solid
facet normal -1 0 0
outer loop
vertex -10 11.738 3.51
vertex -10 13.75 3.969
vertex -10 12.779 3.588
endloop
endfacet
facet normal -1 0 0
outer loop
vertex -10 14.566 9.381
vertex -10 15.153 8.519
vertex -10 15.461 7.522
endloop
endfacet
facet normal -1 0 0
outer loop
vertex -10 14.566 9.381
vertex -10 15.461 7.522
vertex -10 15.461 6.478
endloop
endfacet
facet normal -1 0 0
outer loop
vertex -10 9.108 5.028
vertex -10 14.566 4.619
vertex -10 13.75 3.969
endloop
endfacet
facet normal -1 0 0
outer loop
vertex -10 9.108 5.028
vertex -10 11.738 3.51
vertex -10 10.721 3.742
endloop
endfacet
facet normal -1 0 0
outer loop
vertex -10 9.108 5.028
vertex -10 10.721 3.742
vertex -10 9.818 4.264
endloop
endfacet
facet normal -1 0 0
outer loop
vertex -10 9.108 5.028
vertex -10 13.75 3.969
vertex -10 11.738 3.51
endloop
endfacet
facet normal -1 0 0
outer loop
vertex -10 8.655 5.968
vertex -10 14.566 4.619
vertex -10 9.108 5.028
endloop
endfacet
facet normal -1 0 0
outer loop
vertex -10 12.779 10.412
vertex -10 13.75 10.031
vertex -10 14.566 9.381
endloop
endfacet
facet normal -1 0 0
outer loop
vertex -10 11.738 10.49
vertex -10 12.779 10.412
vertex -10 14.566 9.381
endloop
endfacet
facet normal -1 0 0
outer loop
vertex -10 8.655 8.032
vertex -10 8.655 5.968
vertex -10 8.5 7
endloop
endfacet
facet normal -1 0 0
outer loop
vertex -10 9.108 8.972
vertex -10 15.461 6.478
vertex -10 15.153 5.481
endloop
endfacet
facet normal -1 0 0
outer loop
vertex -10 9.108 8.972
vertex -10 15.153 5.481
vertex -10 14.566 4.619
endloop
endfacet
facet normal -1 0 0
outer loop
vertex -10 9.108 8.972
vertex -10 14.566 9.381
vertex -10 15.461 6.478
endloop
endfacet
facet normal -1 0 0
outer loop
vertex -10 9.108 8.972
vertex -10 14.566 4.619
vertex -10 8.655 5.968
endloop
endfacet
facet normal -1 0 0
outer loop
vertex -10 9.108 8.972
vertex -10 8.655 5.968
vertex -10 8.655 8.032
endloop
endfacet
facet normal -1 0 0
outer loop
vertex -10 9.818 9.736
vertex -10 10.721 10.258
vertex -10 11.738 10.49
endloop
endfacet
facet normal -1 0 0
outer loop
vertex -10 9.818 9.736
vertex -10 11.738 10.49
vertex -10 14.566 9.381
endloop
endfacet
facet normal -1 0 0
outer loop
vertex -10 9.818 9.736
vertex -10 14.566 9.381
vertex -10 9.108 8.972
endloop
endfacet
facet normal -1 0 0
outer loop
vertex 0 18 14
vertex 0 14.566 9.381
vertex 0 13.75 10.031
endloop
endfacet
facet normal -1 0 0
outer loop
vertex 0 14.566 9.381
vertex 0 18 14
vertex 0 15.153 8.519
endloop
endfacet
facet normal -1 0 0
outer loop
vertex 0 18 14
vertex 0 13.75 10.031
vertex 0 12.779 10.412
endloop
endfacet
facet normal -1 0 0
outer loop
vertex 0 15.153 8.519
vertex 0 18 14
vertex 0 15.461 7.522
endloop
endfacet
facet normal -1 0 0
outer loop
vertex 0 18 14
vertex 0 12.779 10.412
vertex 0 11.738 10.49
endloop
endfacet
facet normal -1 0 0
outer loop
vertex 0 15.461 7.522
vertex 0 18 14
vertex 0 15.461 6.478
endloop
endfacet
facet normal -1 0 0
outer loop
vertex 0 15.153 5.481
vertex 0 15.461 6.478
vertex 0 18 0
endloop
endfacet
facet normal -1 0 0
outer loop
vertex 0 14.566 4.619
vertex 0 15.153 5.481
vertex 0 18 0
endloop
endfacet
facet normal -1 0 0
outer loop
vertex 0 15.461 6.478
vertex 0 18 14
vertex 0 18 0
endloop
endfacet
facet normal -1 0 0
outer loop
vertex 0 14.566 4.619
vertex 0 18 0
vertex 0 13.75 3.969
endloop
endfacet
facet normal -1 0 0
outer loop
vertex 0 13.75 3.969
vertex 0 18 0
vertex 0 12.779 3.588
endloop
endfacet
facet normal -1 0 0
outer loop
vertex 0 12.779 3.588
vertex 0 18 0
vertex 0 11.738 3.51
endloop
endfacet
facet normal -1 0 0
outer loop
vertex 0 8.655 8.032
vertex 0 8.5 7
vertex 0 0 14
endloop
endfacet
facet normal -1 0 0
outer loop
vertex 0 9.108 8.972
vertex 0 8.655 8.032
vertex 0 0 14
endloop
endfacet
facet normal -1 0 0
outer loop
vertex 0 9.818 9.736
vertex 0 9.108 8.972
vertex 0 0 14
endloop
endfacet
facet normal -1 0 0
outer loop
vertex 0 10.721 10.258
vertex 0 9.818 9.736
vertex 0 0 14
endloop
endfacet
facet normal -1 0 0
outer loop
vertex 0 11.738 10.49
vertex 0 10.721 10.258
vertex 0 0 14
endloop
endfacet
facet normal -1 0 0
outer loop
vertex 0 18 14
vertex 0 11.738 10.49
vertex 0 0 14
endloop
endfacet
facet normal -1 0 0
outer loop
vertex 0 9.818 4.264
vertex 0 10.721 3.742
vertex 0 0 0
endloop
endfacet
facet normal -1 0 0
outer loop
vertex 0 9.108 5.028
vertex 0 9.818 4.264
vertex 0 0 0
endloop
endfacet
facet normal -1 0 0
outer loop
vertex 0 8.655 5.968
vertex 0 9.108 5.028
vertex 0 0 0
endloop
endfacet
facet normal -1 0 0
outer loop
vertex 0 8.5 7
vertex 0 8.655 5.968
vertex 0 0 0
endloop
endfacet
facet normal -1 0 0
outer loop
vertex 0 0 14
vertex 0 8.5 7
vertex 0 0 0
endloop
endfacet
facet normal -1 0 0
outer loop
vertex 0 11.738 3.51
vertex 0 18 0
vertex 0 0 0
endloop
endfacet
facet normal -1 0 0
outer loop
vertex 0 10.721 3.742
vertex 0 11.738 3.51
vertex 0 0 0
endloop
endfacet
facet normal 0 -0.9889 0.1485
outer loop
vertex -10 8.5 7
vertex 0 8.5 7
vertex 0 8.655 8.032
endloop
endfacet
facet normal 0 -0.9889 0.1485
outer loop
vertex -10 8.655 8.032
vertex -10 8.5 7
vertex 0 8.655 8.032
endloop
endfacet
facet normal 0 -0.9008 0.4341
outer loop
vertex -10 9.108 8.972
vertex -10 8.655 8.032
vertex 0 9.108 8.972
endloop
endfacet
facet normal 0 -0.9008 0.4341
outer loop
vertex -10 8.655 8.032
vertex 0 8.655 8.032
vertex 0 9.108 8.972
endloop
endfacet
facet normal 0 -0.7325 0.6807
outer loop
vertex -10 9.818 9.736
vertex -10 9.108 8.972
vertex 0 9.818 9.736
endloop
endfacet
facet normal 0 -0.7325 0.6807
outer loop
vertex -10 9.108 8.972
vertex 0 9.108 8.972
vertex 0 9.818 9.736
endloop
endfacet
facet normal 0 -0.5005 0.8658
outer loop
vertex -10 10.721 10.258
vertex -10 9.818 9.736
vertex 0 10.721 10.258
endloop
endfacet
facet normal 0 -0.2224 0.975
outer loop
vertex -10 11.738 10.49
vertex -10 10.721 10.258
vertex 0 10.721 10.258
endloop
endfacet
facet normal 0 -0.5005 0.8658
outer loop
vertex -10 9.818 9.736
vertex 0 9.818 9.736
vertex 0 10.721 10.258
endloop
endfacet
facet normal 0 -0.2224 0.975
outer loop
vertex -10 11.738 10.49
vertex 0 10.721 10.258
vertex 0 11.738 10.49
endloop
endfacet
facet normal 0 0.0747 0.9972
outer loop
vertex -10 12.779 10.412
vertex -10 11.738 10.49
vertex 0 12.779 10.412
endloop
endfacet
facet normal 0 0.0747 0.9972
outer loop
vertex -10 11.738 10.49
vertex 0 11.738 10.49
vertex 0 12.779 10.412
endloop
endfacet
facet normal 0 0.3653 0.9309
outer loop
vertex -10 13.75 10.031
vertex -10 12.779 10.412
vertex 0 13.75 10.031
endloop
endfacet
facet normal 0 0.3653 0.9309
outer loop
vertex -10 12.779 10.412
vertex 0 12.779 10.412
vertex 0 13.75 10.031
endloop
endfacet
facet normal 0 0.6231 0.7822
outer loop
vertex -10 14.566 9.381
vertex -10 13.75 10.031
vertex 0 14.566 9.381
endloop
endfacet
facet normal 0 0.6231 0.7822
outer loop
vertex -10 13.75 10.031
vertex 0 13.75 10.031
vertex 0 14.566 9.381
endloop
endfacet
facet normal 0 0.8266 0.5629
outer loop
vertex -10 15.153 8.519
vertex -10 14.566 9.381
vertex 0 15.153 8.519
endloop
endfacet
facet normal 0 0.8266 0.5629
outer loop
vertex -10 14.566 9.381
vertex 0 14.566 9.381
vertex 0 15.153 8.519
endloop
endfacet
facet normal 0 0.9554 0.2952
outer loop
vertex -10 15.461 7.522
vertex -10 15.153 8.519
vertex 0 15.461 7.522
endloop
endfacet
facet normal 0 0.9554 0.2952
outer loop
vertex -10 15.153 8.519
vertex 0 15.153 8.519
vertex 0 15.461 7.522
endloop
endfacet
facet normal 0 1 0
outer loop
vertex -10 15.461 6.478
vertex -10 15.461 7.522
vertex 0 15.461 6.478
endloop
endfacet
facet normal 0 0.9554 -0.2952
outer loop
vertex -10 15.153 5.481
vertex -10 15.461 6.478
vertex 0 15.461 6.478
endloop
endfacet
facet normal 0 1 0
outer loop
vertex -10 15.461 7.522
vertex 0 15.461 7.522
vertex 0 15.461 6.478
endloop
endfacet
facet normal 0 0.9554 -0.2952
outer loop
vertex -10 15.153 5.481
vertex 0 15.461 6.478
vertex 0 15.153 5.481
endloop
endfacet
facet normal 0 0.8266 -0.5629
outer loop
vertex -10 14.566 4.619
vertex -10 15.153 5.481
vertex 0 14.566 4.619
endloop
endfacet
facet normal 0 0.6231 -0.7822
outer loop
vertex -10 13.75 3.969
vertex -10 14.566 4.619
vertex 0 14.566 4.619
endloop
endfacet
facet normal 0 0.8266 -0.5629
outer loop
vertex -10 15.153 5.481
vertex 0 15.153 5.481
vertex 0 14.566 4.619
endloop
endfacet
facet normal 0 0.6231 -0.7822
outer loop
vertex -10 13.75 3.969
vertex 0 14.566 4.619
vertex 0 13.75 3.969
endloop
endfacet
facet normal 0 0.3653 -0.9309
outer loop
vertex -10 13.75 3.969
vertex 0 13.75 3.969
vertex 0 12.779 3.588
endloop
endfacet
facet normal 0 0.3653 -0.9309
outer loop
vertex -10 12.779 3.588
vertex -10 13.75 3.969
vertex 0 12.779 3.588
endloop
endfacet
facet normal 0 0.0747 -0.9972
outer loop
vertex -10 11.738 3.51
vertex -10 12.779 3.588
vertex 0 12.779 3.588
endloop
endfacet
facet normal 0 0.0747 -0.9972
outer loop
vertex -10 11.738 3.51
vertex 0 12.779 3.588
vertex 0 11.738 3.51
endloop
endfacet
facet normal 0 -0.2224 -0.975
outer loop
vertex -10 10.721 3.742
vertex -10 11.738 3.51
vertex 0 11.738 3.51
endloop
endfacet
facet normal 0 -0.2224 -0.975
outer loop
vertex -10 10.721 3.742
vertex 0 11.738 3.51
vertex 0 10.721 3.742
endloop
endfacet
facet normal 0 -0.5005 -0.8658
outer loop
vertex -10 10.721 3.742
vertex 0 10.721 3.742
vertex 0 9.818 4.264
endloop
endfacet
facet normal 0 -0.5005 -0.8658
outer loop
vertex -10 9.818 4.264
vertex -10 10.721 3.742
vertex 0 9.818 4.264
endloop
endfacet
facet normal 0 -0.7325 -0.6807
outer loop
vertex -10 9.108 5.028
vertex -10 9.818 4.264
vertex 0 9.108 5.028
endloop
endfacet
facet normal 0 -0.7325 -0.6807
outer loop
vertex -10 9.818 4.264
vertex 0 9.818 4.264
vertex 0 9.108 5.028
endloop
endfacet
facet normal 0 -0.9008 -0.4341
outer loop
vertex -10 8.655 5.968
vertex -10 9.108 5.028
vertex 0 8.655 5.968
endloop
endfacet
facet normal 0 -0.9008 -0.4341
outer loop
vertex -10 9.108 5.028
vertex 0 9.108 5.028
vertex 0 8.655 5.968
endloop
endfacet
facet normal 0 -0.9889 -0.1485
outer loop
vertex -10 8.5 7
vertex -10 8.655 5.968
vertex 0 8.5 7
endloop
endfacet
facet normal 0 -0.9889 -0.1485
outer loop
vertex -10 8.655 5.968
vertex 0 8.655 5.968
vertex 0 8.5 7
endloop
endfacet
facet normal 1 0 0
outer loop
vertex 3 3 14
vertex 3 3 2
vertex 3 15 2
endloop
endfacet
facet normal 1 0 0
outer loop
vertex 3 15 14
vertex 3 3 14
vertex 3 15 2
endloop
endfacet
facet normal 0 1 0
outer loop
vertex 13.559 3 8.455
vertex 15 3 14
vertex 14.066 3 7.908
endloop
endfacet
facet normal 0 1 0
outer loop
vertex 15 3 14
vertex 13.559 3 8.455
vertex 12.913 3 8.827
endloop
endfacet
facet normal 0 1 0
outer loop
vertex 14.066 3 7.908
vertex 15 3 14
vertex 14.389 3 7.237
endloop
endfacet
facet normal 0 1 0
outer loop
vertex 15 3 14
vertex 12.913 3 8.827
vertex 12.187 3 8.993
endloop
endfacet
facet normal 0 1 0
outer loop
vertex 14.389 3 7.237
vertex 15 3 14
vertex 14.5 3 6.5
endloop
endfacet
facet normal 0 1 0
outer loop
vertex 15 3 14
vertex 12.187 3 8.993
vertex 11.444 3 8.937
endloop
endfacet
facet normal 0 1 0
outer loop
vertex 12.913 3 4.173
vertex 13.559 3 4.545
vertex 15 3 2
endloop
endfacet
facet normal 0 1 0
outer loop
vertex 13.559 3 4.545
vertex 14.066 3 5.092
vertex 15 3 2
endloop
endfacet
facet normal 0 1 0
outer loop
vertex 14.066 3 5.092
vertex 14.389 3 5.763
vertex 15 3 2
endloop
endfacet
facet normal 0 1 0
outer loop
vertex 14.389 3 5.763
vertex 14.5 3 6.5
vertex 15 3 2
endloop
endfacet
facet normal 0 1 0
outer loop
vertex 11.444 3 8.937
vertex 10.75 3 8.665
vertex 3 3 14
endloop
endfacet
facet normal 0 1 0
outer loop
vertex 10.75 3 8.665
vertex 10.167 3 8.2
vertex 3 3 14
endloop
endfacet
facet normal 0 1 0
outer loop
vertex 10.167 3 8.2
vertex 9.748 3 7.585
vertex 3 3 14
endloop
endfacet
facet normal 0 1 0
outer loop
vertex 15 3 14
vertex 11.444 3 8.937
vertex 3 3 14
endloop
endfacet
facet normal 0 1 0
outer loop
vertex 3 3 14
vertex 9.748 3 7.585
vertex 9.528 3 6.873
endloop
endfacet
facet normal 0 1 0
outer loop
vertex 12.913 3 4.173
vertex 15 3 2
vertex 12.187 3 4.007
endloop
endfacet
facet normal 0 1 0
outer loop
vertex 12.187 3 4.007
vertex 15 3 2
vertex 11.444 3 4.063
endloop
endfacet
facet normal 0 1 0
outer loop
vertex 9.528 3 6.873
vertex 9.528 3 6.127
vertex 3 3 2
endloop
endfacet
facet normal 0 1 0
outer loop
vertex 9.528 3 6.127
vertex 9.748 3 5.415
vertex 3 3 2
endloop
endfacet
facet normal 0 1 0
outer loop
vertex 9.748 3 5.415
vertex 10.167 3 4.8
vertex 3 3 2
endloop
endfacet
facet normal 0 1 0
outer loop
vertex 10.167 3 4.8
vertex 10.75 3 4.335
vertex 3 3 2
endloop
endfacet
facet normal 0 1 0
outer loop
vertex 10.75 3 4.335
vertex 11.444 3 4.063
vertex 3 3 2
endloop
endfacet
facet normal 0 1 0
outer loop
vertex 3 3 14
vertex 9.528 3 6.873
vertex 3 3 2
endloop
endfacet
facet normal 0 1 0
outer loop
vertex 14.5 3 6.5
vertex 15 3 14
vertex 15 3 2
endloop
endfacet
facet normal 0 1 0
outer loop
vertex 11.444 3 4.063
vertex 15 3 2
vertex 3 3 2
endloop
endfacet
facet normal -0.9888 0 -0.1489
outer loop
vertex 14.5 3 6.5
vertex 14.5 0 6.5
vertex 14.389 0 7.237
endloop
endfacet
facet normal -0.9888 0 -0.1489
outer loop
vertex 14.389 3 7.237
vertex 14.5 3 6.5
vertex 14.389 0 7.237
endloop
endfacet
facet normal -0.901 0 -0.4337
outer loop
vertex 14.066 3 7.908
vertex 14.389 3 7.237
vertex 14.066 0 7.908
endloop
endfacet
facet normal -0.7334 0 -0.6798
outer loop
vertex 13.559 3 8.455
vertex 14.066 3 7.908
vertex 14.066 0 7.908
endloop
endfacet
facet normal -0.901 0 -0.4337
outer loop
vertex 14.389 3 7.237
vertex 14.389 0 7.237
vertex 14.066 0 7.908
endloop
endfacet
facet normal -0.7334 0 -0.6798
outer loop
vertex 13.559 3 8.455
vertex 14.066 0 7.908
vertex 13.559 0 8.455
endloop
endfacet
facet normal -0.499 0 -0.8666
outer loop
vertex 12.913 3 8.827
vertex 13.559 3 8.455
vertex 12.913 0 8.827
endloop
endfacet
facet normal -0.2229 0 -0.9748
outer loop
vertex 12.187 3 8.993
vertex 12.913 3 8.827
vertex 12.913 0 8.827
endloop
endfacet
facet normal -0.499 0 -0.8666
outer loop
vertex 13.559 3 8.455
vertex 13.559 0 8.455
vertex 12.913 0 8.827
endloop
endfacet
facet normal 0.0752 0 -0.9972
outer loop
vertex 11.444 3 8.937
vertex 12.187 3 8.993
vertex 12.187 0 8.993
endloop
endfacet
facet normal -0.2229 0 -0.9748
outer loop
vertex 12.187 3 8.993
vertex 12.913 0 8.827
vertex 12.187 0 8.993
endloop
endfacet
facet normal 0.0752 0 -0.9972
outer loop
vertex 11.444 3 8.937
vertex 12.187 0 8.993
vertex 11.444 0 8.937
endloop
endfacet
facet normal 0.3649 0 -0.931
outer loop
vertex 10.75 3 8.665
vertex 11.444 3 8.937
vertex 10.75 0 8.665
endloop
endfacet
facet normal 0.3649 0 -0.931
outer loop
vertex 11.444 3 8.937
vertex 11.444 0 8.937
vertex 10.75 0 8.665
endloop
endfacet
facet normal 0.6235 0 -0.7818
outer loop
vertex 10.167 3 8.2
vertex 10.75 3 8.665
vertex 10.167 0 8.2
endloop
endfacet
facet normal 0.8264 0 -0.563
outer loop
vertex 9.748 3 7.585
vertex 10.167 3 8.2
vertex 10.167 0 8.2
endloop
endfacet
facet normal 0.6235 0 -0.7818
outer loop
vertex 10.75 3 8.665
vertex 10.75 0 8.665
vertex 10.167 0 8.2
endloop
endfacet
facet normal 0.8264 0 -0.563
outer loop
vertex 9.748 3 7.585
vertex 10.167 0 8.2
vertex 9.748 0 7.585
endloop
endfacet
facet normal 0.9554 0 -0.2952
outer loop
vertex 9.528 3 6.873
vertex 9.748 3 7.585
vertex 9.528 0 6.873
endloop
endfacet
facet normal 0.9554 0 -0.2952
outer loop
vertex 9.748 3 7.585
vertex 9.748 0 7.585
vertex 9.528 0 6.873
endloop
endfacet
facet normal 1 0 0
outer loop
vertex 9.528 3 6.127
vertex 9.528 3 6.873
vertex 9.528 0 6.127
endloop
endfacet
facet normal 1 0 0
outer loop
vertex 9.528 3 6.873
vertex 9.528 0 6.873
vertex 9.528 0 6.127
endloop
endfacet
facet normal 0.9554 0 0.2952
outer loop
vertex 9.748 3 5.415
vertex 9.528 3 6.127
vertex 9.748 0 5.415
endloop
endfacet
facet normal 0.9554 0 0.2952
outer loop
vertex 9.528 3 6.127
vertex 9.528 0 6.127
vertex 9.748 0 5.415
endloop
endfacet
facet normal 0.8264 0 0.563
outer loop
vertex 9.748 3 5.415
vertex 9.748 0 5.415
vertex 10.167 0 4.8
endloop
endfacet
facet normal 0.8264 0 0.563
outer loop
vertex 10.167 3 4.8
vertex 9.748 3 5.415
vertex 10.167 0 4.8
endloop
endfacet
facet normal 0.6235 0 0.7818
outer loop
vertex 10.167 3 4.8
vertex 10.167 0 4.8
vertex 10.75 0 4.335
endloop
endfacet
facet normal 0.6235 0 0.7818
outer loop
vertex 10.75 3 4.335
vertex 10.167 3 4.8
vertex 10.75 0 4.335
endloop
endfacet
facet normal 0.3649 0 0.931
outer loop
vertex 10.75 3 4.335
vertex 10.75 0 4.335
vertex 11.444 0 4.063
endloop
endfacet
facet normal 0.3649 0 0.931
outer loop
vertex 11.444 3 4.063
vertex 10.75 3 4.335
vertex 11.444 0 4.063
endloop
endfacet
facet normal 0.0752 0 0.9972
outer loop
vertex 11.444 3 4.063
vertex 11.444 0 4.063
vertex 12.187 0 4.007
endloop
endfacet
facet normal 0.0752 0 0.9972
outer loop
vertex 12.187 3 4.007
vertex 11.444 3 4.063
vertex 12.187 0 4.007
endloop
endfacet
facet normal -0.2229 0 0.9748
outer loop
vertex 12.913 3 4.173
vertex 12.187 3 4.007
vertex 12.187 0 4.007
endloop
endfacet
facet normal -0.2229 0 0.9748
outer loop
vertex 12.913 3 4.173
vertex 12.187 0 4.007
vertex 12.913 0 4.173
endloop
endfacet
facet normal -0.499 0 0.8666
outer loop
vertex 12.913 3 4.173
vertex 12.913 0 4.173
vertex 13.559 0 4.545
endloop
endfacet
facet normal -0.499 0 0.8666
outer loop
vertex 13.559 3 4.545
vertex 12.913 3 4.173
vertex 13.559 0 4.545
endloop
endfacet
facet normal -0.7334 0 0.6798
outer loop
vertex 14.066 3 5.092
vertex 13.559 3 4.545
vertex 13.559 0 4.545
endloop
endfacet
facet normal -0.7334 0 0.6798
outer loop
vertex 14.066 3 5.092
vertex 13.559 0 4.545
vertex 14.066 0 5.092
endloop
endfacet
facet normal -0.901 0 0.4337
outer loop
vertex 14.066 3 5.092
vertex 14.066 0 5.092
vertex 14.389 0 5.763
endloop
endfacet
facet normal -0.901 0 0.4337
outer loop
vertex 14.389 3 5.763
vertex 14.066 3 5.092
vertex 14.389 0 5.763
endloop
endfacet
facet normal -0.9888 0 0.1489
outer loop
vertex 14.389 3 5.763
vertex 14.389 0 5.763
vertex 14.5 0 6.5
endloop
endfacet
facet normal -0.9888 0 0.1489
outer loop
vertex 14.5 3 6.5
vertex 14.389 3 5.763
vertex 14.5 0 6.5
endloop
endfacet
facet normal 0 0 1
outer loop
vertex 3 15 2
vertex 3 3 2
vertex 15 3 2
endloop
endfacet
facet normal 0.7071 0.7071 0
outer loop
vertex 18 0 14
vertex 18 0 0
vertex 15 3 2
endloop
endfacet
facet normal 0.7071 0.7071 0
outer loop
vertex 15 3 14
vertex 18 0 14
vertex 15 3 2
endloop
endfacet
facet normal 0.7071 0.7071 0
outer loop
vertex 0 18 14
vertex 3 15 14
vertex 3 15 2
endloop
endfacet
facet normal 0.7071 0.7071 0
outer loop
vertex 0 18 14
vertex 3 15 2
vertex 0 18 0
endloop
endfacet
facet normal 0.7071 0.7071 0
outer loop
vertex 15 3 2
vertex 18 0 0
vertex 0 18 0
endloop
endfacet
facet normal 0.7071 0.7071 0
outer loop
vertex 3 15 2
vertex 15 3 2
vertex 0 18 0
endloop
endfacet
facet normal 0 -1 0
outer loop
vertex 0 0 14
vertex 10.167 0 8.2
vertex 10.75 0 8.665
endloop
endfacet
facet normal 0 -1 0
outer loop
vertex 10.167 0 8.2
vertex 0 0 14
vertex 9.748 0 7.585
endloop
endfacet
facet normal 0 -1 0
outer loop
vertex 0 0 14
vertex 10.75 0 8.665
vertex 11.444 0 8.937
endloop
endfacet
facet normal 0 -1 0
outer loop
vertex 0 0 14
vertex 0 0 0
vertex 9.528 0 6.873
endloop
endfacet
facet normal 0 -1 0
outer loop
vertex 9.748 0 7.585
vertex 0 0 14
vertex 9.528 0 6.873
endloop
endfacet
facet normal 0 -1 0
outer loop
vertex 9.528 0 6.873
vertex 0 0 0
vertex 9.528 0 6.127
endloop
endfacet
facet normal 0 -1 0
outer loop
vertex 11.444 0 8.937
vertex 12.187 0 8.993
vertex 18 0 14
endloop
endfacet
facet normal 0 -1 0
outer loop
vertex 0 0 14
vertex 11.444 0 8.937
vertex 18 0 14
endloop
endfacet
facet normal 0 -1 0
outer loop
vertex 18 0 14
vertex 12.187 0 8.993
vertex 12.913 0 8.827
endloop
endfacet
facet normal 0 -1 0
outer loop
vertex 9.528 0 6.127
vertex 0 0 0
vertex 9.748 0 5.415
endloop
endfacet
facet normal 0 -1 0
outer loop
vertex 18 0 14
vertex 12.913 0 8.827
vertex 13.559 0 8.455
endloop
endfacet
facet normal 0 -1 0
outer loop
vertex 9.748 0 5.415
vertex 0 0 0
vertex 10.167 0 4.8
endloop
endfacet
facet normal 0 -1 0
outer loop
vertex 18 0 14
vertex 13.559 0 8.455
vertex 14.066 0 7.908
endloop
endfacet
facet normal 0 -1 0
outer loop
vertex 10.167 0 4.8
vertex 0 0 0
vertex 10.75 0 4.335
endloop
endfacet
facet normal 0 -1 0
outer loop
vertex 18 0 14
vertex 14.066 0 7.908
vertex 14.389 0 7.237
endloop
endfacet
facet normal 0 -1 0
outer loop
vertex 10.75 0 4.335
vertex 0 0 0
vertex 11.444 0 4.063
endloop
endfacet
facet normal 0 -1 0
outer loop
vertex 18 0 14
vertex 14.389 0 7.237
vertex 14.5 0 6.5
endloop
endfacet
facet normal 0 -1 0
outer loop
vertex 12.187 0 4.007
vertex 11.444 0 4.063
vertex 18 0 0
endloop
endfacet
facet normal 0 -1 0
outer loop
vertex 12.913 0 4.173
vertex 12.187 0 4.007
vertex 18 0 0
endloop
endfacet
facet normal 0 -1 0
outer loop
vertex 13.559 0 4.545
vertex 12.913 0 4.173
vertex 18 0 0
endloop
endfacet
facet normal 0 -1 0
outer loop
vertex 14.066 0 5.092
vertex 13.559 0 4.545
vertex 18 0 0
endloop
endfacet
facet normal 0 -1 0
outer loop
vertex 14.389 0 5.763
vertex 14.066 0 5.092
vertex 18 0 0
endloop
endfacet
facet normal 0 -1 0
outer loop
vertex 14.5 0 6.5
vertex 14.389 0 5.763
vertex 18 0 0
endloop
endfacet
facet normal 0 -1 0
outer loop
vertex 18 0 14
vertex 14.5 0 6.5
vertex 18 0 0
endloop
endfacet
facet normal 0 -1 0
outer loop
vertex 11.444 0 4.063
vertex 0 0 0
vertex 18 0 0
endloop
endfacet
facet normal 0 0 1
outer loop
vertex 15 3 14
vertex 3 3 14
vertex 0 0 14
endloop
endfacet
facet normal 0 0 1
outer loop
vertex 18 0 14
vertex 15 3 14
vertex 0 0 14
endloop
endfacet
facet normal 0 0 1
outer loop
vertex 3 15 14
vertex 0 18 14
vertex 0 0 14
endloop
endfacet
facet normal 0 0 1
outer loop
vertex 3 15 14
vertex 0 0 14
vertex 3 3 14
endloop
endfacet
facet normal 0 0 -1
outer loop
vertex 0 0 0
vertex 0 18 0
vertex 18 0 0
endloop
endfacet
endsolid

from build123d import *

# Parameters (mm, degrees)
F1_DEPTH = 2
F3_DEPTH = 12
F4_R     = 3.5
F5_DEPTH = 10
F6_R     = 2.5
F7_DEPTH = 18.001


with BuildPart() as f1:
    # F0 (on Top) → F1 (new body)
    with BuildSketch(Plane.XY):
        Polygon((0, 18), (0, 0), (18, 0), align=None)
    extrude(amount=F1_DEPTH)

    # F2 (on face) → F3 (join)
    with BuildSketch(Plane.XY.offset(2)):
        Polygon((0, 18), (0, 0), (18, 0), (15, 3), (3, 3), (3, 15), align=None)
    extrude(amount=F3_DEPTH)

    # F4 (on face) → F5 (join)
    with BuildSketch(Plane(origin=(0, 0, 0), x_dir=(0, -1, 0), z_dir=(-1, 0, 0))):
        with Locations((-12, 7)):
            Circle(F4_R)
    extrude(amount=F5_DEPTH)

    # F6 (on face) → F7 (cut, through all)
    with BuildSketch(Plane.XZ):
        with Locations((12, 6.5)):
            Circle(F6_R)
    extrude(amount=-F7_DEPTH, mode=Mode.SUBTRACT)


solid = f1.part
